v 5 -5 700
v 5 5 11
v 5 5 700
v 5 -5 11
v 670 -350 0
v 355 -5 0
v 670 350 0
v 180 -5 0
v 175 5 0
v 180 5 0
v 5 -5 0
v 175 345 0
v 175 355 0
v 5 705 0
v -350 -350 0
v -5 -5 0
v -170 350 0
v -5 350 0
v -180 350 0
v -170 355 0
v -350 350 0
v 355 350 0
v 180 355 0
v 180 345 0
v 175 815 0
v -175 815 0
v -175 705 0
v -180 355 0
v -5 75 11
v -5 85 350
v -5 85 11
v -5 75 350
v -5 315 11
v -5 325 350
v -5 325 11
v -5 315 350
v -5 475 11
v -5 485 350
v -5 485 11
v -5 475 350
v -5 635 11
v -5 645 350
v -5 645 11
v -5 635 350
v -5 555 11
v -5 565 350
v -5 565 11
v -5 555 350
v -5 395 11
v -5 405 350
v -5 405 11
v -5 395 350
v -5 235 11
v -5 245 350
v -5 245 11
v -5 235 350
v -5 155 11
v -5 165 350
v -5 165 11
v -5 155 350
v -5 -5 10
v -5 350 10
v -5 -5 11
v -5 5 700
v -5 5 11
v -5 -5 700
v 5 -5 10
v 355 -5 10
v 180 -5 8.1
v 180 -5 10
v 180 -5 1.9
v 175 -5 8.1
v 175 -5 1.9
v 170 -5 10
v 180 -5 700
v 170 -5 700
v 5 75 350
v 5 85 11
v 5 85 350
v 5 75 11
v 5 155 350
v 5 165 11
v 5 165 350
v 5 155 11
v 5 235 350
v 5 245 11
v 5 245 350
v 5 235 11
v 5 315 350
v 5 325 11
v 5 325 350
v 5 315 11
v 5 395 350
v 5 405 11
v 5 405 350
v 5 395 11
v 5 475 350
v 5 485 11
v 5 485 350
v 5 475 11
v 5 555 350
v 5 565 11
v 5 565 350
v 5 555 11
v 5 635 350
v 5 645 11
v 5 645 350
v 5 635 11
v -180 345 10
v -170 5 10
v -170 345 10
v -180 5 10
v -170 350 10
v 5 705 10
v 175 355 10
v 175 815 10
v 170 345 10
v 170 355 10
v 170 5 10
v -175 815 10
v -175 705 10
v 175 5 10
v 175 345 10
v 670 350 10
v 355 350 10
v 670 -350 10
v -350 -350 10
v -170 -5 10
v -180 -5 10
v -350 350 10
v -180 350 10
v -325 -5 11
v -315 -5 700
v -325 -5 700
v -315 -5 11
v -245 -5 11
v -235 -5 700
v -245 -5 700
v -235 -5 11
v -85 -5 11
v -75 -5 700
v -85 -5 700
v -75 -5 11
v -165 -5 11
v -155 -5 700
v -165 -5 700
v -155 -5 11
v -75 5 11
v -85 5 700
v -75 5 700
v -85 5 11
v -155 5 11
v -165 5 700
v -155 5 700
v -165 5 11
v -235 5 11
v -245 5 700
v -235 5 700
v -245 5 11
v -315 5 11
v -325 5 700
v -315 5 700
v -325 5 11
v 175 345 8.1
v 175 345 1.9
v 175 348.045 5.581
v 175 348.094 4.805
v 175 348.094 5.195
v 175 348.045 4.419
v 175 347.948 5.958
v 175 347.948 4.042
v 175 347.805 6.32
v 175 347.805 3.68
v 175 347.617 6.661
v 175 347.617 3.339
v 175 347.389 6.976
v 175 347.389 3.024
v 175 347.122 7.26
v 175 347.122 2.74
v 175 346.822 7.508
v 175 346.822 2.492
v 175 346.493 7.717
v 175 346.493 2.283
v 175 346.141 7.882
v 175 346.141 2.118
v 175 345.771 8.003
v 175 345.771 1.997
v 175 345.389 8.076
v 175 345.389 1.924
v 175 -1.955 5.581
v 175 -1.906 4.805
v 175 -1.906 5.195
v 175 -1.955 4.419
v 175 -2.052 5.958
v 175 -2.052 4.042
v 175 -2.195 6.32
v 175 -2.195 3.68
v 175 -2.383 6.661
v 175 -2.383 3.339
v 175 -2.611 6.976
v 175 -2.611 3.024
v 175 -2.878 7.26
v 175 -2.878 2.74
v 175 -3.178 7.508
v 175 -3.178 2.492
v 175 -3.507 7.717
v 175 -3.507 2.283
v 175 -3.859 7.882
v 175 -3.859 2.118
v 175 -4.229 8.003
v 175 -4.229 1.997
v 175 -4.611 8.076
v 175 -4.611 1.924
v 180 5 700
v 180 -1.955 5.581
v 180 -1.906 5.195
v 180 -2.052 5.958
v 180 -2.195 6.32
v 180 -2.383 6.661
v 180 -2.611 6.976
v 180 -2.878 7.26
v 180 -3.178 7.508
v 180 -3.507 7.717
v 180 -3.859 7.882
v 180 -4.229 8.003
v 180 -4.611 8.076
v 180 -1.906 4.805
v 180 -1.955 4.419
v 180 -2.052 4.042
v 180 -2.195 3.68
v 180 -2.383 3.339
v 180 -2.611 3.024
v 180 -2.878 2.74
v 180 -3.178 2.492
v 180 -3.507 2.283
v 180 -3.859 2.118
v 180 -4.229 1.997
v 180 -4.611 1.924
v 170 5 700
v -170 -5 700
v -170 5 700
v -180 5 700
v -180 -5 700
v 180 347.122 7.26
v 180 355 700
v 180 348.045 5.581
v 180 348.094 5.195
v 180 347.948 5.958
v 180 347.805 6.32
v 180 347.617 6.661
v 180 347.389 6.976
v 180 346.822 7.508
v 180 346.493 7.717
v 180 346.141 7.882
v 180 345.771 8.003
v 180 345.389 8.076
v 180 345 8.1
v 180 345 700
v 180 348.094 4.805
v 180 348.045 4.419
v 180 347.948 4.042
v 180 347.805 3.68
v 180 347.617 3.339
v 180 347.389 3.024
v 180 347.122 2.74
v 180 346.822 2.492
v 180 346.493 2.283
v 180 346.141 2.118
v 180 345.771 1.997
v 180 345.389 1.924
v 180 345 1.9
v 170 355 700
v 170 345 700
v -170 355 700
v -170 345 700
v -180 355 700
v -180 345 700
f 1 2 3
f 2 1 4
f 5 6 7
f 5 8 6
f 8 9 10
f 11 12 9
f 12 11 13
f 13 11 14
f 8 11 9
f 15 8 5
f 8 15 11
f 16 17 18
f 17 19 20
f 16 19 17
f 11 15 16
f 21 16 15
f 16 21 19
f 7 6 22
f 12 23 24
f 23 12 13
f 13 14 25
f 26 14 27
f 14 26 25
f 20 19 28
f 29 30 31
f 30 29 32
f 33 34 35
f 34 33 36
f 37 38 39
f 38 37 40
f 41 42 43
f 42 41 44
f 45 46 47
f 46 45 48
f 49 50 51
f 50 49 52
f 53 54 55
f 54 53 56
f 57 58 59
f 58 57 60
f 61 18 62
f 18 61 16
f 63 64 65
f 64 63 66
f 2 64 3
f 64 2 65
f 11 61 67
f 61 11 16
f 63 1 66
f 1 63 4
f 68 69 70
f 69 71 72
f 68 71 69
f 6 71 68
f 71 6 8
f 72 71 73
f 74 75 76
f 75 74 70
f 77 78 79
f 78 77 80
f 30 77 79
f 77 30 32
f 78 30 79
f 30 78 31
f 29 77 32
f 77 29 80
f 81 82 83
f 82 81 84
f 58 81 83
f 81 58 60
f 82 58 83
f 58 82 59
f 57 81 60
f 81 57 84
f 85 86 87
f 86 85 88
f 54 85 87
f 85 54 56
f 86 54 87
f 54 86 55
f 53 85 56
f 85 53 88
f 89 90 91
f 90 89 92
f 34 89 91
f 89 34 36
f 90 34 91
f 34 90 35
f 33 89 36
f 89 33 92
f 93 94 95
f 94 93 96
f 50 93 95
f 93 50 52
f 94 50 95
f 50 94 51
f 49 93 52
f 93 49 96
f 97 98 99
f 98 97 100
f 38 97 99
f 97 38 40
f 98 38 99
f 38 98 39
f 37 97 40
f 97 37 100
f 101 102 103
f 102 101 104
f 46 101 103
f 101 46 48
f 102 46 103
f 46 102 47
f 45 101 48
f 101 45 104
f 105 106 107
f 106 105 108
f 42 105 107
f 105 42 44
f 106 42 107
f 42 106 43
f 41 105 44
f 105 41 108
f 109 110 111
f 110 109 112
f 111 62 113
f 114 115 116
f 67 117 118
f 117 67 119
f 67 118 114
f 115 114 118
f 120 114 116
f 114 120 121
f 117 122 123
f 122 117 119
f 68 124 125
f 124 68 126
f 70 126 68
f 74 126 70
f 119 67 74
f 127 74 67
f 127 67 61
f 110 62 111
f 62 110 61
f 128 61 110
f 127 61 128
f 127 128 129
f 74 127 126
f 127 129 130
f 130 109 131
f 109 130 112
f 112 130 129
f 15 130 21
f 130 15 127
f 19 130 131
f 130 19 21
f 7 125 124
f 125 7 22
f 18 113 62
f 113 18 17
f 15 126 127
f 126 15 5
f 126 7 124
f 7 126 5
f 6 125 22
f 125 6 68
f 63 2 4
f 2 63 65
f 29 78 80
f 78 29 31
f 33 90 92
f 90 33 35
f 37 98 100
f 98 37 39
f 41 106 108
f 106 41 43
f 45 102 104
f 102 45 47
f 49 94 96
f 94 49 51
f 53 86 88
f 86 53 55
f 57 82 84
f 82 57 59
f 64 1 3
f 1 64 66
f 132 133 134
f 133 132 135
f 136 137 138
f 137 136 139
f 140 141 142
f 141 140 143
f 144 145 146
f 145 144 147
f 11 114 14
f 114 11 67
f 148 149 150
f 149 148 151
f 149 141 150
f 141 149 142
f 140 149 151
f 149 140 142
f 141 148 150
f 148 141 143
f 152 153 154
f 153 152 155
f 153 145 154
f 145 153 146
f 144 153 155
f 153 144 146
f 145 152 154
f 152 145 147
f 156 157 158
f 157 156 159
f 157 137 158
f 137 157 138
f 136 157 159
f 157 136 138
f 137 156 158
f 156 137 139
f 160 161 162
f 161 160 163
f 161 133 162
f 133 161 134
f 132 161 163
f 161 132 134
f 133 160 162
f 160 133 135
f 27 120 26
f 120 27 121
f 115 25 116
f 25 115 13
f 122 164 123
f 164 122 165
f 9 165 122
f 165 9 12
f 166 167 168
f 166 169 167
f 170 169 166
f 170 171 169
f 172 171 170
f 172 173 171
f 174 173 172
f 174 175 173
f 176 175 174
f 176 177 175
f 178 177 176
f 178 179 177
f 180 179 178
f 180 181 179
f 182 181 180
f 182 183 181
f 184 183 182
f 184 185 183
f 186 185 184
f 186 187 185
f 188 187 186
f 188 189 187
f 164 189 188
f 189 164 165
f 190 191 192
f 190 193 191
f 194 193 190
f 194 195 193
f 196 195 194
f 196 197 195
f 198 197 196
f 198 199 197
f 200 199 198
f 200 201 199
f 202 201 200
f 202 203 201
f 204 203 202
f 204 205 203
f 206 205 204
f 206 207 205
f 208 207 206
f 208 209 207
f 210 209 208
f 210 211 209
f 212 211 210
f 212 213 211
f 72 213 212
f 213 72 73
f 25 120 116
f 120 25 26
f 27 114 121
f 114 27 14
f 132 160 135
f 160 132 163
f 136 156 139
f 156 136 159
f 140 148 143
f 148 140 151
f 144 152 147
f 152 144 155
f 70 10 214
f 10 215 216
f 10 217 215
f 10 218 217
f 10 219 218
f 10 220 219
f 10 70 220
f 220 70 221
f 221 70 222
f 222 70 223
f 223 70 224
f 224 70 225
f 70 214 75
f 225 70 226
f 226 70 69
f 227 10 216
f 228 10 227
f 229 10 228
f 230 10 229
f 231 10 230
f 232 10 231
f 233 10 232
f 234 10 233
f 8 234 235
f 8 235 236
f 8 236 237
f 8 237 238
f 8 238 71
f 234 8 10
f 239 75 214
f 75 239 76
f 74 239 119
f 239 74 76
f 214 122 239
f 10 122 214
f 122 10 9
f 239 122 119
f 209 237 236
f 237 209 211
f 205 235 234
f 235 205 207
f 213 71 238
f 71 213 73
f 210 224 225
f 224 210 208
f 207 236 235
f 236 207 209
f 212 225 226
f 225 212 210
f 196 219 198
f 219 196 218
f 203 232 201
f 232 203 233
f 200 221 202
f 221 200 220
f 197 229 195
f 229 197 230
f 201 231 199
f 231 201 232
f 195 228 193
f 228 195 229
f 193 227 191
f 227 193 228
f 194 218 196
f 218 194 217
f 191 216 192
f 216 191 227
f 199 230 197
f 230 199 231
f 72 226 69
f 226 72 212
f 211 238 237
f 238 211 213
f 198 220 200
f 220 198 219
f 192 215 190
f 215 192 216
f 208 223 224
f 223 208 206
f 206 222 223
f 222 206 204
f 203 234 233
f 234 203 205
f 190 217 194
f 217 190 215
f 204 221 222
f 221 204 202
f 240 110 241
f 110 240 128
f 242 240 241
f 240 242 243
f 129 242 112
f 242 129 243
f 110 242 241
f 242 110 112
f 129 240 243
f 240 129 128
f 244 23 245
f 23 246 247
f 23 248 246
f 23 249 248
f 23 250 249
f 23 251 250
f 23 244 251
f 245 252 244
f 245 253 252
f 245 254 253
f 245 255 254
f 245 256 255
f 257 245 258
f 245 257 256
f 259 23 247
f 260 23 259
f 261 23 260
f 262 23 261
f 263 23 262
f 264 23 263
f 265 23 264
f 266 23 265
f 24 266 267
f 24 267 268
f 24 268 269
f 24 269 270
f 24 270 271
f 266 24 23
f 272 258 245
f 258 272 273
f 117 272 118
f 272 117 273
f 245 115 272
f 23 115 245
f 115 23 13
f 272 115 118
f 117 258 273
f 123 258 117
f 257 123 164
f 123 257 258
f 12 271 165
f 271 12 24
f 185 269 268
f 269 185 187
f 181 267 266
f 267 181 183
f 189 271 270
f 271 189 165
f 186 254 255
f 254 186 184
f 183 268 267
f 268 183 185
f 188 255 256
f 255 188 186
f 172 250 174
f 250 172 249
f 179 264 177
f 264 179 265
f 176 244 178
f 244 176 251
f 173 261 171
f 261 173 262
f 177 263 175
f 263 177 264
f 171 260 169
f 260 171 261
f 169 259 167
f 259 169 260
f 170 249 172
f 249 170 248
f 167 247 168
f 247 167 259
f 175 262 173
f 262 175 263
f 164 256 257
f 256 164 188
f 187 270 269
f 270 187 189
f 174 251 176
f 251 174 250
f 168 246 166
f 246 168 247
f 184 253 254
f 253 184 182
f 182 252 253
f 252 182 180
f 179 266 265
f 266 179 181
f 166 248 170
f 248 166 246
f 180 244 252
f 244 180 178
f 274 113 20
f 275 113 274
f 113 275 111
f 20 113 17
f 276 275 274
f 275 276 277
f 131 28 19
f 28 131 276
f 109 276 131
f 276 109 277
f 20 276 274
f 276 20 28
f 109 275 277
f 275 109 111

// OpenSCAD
module bar(length, width, height)
{
  translate([-width / 2, -width / 2, 0]) cube([width, width, length]);
}

module side_panel(width, height, bar_width, gap)
{
  difference()
  {
    union()
    {
      for(y = [0:gap + bar_width:height])
      {
        translate([0, y, 0]) bar(width, bar_width, bar_width);
      }
      for(x = [0:gap + bar_width:width])
      {
        translate([x, 0, 0]) bar(bar_width, height, bar_width);
      }
    }
    translate([-bar_width / 2, -bar_width / 2, -1]) cube([width + bar_width, height + bar_width, bar_width + 2]);
  }
}

module corner_post(length, width)
{
  difference()
  {
    bar(length, width, width);
    translate([-width / 2, -width / 2, width / 2]) rotate([0, 90, 0]) cylinder(h = width + 1, d = 6.2, $fn = 50);
  }
}

// Front and Back Panels
side_panel(350, 700, 10, 70); // Left and Right Panels
rotate([0, 0, 90]) side_panel(700, 350, 10, 70); // Corner Posts
translate([175, 0, 0]) corner_post(700, 10);
translate([-175, 0, 0]) corner_post(700, 10);
translate([175, 350, 0]) corner_post(700, 10);
translate([-175, 350, 0]) corner_post(700, 10);
